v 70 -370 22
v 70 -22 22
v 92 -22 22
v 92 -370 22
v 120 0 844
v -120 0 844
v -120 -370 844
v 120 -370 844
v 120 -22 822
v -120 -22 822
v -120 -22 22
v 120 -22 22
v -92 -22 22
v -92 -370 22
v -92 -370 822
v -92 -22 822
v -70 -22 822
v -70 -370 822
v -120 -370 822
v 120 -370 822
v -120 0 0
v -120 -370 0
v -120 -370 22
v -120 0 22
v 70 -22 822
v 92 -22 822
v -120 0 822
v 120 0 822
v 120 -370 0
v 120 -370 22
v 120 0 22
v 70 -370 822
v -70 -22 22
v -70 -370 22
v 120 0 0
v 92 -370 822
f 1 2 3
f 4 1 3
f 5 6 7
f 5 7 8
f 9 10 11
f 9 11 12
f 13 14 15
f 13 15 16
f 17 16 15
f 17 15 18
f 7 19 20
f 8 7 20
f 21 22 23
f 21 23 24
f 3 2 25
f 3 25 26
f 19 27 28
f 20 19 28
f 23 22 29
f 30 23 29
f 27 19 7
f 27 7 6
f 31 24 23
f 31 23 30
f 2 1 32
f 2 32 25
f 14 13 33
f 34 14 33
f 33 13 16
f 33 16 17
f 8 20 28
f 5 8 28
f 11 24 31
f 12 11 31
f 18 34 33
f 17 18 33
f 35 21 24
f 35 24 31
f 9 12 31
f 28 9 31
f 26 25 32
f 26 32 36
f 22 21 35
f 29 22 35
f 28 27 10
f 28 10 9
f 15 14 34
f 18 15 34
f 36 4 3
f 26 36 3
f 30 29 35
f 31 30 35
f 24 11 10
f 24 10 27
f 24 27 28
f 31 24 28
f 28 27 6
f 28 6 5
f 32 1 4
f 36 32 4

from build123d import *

# Parameters (mm, degrees)
SKIZZE1_W                         = 240
SKIZZE1_H                         = 370
AUFSATZ_LINEAR_AUSTRAGEN1_DEPTH   = 22
SKIZZE2_W                         = 22
SKIZZE2_H                         = 348
AUFSATZ_LINEAR_AUSTRAGEN2_DEPTH   = 800
AUFSATZ_LINEAR_AUSTRAGEN2_2_DEPTH = 800
SKIZZE3_W                         = 240
SKIZZE3_H                         = 22
AUFSATZ_LINEAR_AUSTRAGEN3_DEPTH   = 800
SKIZZE4_W                         = 240
SKIZZE4_H                         = 370
AUFSATZ_LINEAR_AUSTRAGEN4_DEPTH   = 22


with BuildPart() as part:
    # Skizze1 → Aufsatz-Linear austragen1 (new body)
    with BuildSketch(Plane.XY):
        with Locations((0, -185)):
            Rectangle(SKIZZE1_W, SKIZZE1_H)
    extrude(amount=AUFSATZ_LINEAR_AUSTRAGEN1_DEPTH)


with BuildPart() as body_2:
    # Skizze2 → Aufsatz-Linear austragen2 (new body)
    with BuildSketch(Plane.XY.offset(22)):
        with Locations((81, -196)):
            Rectangle(SKIZZE2_W, SKIZZE2_H)
    extrude(amount=AUFSATZ_LINEAR_AUSTRAGEN2_DEPTH)


with BuildPart() as body_3:
    # Skizze2 → Aufsatz-Linear austragen2 2 (new body)
    with BuildSketch(Plane.XY.offset(22)):
        with Locations((-81, -196)):
            Rectangle(SKIZZE2_W, SKIZZE2_H)
    extrude(amount=AUFSATZ_LINEAR_AUSTRAGEN2_2_DEPTH)


with BuildPart() as body_4:
    # Skizze3 → Aufsatz-Linear austragen3 (new body)
    with BuildSketch(Plane.XY.offset(22)):
        with Locations((0, -11)):
            Rectangle(SKIZZE3_W, SKIZZE3_H)
    extrude(amount=AUFSATZ_LINEAR_AUSTRAGEN3_DEPTH)


with BuildPart() as body_5:
    # Skizze4 → Aufsatz-Linear austragen4 (new body)
    with BuildSketch(Plane.XY.offset(822)):
        with Locations((0, -185)):
            Rectangle(SKIZZE4_W, SKIZZE4_H)
    extrude(amount=AUFSATZ_LINEAR_AUSTRAGEN4_DEPTH)


solid = Compound([part.part, body_2.part, body_3.part, body_4.part, body_5.part])
